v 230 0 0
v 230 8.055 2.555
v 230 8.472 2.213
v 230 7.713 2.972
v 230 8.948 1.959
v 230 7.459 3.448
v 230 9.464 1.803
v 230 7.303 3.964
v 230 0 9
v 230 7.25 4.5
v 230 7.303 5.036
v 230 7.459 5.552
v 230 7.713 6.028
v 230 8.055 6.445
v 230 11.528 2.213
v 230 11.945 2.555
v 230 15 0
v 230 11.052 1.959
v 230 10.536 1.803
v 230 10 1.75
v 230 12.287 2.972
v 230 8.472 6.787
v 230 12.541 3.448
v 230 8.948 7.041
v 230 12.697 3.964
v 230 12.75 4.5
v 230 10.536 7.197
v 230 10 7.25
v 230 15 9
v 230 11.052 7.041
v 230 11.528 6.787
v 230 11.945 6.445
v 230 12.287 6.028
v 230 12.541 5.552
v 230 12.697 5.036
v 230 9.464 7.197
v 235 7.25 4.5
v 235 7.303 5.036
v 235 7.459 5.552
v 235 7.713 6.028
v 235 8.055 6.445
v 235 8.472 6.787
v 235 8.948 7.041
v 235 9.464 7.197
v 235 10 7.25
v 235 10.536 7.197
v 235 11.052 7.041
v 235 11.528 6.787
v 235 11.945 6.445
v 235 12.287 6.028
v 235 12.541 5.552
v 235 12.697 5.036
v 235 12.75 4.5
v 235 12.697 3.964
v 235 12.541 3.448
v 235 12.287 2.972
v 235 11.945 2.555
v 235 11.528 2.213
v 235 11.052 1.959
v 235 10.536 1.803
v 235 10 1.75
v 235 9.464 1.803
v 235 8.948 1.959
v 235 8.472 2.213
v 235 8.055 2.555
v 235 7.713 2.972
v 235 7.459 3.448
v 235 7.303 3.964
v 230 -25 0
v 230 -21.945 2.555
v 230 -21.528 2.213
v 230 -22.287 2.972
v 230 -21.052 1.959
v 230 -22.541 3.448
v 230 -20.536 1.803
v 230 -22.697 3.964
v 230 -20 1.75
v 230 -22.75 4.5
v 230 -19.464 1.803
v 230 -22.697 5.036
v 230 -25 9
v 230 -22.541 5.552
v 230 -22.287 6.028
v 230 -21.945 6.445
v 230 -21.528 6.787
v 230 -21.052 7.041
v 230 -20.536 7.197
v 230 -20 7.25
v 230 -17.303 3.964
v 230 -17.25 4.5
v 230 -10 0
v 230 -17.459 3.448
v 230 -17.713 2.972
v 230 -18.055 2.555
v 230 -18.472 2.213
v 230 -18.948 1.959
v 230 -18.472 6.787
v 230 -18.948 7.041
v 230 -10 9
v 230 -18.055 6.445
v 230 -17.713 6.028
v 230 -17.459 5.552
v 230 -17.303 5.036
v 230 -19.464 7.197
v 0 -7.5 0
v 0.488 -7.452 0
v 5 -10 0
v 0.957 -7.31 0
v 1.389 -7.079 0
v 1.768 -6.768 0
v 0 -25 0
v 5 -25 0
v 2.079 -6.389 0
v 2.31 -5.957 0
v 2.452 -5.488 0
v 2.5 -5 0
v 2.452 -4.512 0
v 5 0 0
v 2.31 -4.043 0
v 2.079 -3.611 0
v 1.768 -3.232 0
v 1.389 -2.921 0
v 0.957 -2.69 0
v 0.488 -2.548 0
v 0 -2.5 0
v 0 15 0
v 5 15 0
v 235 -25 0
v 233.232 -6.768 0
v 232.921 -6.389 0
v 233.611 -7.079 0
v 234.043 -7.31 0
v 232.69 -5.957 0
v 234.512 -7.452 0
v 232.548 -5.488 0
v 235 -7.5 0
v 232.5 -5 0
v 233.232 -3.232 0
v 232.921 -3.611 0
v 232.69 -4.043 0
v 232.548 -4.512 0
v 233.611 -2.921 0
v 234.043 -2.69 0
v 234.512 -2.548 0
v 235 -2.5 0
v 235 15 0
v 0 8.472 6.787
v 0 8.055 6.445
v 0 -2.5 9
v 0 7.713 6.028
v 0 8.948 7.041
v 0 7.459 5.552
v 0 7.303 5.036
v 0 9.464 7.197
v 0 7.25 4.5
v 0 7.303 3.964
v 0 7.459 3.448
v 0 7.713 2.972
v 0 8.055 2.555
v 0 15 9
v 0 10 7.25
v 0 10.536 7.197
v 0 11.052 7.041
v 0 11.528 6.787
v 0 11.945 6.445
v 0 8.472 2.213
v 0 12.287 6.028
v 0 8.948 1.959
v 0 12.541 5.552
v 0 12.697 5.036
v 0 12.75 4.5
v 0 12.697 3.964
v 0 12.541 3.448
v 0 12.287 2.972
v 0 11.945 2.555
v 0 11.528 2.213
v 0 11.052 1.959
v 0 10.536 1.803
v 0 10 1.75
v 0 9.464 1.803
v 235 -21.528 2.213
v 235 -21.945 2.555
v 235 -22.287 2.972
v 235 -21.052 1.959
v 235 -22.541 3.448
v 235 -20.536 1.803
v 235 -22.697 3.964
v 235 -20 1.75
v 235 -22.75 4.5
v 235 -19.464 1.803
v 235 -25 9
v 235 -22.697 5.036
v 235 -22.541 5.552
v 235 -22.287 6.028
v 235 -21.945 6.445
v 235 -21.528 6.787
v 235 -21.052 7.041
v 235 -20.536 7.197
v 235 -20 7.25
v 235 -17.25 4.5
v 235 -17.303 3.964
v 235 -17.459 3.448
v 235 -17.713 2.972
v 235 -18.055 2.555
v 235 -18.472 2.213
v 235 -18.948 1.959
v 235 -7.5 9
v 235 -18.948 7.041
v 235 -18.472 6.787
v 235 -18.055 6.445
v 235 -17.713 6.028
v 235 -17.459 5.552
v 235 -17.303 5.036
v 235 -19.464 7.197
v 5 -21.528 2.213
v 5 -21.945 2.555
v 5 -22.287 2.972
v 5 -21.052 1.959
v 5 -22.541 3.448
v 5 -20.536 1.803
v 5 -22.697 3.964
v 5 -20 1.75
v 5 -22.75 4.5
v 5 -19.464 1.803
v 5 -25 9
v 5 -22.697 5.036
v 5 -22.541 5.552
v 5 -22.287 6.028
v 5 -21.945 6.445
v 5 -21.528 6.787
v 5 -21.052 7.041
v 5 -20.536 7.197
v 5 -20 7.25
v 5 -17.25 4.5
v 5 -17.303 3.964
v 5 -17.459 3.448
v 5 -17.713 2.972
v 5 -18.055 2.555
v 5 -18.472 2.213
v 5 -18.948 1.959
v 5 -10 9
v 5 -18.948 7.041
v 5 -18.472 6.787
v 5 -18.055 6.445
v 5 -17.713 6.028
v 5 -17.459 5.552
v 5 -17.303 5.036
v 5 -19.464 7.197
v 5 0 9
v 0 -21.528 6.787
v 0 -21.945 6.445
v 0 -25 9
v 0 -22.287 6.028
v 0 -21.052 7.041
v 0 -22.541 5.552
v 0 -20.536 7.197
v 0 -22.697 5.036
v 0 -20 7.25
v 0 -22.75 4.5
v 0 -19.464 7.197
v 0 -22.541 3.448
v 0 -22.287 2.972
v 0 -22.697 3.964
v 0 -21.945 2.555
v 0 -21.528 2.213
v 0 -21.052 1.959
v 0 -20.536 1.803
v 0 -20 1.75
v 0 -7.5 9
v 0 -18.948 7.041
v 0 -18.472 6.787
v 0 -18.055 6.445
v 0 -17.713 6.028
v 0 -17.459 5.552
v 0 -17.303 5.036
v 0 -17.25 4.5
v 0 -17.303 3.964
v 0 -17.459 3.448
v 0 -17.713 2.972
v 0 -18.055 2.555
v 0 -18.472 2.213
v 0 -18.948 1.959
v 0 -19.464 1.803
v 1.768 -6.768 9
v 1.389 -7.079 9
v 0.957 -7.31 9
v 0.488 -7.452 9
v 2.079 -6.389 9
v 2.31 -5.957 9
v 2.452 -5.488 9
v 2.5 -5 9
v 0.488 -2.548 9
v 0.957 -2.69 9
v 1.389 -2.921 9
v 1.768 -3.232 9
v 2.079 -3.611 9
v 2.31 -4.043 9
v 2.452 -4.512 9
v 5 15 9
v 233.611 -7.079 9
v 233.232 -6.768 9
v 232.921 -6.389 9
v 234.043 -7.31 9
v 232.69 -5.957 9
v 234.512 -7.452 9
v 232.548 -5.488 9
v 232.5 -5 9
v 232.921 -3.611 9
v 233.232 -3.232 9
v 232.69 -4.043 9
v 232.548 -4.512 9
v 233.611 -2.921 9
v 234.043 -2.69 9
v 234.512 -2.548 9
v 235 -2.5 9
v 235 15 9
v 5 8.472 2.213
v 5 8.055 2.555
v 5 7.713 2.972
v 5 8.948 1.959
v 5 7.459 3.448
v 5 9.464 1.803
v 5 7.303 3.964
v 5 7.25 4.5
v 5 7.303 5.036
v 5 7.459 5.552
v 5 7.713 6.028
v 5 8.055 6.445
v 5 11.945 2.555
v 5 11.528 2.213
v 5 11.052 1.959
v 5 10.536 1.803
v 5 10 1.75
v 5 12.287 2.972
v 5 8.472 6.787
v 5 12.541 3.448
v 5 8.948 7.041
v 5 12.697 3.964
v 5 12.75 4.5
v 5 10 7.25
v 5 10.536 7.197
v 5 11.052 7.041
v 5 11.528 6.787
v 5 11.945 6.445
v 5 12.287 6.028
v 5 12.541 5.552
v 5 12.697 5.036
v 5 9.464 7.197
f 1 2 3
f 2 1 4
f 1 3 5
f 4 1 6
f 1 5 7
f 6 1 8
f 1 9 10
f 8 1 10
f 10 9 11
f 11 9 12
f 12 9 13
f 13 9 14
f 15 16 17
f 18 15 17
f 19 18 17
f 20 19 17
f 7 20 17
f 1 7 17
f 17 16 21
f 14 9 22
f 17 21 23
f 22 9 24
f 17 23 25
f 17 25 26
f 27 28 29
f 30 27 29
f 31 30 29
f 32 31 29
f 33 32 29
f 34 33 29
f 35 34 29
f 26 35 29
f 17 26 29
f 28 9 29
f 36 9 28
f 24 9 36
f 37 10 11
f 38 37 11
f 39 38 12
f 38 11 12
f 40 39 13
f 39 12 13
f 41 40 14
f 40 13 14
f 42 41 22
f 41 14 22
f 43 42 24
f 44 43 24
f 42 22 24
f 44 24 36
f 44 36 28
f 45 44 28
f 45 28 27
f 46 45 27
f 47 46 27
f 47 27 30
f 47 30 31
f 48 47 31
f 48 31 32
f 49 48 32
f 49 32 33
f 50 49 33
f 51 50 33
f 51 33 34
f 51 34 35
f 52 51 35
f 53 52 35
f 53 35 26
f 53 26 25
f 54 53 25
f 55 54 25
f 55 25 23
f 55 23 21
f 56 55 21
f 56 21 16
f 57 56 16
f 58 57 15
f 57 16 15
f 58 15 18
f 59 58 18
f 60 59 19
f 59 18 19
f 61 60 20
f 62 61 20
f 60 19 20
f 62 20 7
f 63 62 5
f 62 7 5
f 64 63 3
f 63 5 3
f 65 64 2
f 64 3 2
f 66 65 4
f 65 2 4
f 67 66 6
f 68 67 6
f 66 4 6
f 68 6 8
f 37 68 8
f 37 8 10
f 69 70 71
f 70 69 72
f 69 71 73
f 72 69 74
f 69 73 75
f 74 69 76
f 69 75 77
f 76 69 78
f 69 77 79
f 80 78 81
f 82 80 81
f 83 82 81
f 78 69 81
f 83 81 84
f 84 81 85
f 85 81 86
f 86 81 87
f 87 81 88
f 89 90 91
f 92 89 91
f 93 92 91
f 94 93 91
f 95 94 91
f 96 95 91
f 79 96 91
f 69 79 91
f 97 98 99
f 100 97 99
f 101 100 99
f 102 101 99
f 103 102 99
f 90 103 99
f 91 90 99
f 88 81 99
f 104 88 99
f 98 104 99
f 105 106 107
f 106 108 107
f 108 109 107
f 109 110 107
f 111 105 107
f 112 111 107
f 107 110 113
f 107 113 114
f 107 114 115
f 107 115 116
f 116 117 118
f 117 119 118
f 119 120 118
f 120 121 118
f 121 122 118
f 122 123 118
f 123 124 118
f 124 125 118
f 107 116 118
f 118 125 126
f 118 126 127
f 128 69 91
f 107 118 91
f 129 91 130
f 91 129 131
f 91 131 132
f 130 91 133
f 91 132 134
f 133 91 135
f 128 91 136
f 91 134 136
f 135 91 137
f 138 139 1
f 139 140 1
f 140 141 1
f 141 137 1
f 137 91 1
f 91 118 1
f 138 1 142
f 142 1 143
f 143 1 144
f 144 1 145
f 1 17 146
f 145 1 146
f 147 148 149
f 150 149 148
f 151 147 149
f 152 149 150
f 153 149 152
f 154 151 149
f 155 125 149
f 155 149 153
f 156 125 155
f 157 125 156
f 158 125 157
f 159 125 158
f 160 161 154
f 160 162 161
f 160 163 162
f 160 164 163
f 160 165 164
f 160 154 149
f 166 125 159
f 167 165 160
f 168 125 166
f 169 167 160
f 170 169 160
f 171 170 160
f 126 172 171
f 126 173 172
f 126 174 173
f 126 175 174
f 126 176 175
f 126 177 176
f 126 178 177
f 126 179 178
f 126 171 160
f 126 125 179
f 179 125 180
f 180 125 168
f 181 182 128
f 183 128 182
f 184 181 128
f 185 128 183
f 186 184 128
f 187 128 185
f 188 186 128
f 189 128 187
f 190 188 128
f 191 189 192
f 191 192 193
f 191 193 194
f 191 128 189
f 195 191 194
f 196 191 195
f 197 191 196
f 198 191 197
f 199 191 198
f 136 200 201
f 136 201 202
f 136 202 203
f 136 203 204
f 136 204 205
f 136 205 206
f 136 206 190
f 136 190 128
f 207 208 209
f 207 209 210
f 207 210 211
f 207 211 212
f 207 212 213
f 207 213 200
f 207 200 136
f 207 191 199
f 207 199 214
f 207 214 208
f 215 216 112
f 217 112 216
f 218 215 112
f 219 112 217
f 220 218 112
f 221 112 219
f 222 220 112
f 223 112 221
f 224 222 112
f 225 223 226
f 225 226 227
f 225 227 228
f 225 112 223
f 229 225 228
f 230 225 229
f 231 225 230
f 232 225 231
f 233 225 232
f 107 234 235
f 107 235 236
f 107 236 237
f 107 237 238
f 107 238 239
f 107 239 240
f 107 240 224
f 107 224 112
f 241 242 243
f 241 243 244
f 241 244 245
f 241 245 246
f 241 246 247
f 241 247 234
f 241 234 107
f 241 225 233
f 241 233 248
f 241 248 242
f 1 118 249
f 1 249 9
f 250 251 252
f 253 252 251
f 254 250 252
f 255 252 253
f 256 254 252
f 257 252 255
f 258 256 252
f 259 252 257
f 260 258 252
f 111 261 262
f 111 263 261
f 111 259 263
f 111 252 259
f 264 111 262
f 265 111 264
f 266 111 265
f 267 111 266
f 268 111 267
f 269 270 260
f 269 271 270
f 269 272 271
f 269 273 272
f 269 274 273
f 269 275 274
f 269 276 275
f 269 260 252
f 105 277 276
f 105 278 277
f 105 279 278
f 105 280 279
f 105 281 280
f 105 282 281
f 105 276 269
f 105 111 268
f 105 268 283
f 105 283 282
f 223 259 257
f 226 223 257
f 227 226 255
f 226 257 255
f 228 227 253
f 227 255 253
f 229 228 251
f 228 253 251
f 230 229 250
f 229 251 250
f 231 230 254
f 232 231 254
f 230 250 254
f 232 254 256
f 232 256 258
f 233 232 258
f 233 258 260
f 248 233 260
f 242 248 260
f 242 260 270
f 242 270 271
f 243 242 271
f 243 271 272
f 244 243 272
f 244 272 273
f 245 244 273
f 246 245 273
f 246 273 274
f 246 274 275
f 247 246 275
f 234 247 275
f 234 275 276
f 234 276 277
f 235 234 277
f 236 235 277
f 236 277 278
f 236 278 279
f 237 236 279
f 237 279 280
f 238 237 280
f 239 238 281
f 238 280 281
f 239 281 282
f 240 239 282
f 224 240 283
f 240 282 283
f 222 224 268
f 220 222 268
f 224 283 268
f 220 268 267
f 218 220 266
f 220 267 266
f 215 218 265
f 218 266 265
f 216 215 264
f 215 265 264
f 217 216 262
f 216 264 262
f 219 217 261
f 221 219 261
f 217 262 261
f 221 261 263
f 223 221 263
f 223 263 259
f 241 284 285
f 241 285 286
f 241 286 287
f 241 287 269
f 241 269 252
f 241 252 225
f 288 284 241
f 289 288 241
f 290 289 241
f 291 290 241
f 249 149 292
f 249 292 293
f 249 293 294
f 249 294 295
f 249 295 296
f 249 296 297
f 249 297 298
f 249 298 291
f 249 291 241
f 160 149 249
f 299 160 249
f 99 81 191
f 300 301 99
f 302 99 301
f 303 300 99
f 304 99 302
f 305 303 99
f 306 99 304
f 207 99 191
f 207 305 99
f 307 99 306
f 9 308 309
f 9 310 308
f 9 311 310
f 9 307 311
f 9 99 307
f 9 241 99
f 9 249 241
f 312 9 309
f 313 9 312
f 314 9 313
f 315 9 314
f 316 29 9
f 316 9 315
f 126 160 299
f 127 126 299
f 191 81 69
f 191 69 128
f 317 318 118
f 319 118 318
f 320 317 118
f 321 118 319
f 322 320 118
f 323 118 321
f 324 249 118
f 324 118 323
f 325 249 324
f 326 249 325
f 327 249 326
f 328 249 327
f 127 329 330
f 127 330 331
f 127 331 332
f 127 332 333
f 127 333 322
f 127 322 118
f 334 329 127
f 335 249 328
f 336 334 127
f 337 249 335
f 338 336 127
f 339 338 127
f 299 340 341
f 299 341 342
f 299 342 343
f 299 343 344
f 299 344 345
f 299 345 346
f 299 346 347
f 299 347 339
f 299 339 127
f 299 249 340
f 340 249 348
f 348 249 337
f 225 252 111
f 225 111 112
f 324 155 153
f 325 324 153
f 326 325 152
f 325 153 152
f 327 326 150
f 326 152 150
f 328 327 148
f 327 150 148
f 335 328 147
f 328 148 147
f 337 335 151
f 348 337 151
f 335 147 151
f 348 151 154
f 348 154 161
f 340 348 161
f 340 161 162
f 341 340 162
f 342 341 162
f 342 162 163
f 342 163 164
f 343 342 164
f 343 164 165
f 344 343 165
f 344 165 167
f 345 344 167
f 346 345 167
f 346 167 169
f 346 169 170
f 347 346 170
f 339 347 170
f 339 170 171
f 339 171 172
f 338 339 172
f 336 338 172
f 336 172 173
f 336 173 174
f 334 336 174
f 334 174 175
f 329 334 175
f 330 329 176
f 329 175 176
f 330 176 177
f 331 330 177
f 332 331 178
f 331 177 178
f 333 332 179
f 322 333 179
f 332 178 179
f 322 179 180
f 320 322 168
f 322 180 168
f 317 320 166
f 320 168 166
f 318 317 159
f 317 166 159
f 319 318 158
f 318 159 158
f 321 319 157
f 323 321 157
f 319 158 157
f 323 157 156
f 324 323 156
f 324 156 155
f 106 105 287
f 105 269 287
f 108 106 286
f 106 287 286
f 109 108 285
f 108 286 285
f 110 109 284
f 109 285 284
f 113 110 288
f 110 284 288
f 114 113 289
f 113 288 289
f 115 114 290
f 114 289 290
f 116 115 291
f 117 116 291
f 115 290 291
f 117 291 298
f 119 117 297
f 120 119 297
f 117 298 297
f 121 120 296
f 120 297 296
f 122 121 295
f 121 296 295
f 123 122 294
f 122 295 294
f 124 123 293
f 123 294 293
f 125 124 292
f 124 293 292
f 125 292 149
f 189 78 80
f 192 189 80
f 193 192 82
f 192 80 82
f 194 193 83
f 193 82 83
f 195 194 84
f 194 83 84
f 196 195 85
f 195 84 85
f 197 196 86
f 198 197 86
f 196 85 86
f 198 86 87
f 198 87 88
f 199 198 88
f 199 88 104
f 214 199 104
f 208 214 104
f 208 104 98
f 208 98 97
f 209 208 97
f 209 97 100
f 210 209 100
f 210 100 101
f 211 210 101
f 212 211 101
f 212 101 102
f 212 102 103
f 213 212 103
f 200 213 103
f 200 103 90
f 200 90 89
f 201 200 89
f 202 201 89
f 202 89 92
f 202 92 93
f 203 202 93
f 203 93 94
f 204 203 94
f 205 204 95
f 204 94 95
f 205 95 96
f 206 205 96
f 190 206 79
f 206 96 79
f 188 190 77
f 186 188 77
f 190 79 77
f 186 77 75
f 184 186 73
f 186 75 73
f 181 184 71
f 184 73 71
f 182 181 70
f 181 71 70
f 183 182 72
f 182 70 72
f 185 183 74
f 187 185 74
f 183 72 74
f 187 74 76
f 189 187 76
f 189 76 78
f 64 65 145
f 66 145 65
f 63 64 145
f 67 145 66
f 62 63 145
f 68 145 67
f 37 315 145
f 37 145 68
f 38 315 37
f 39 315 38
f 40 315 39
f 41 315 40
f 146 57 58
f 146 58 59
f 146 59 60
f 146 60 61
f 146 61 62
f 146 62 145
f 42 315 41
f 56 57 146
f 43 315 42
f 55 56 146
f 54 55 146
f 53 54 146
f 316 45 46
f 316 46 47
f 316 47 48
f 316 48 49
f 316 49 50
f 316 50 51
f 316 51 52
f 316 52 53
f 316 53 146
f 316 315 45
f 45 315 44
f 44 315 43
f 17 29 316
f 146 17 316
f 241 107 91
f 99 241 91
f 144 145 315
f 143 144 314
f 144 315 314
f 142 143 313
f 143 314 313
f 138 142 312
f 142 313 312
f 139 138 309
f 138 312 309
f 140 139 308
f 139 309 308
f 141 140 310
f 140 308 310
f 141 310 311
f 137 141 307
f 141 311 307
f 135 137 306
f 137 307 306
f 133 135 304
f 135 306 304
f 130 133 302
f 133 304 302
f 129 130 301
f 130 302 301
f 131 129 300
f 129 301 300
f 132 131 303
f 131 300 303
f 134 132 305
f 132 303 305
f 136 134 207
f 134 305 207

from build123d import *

# Parameters (mm, degrees)
SKETCH_1_W          = 235
SKETCH_1_H          = 10
EXTRUDE_1_DEPTH     = 9
SKETCH_2_W          = 5
SKETCH_2_H          = 40
EXTRUDE_2_DEPTH     = 9
SKETCH_3_R          = 2.5
CUT_EXTRUDE_1_DEPTH = 32
SKETCH_4_R          = 2.75
CUT_EXTRUDE_2_DEPTH = 237.497357279


with BuildPart() as part:
    # 草图1 → 凸台-拉伸1 (new body)
    with BuildSketch(Plane.XY):
        with Locations((117.5, -5)):
            Rectangle(SKETCH_1_W, SKETCH_1_H)
    extrude(amount=EXTRUDE_1_DEPTH)

    # 草图2 → 凸台-拉伸2 (add)
    with BuildSketch(Plane.XY.offset(9)):
        with Locations((232.5, -5)):
            Rectangle(SKETCH_2_W, SKETCH_2_H)
        with Locations((2.5, -5)):
            Rectangle(SKETCH_2_W, SKETCH_2_H)
    extrude(amount=-EXTRUDE_2_DEPTH)

    # 草图3 → 切除-拉伸1 (cut)
    with BuildSketch(Plane.XY.offset(9)):
        with Locations((235, -5)):
            Circle(SKETCH_3_R)
        with Locations((0, -5)):
            Circle(SKETCH_3_R)
    extrude(amount=-CUT_EXTRUDE_1_DEPTH, mode=Mode.SUBTRACT)

    # 草图4 → 切除-拉伸2 (cut, through all)
    with BuildSketch(Plane.ZY):
        with Locations(Location((4.5, 10, 0), (0, 0, 270))):
            Circle(SKETCH_4_R)
        with Locations(Location((4.5, -20, 0), (0, 0, 270))):
            Circle(SKETCH_4_R)
    extrude(amount=-CUT_EXTRUDE_2_DEPTH, mode=Mode.SUBTRACT)


solid = part.part
